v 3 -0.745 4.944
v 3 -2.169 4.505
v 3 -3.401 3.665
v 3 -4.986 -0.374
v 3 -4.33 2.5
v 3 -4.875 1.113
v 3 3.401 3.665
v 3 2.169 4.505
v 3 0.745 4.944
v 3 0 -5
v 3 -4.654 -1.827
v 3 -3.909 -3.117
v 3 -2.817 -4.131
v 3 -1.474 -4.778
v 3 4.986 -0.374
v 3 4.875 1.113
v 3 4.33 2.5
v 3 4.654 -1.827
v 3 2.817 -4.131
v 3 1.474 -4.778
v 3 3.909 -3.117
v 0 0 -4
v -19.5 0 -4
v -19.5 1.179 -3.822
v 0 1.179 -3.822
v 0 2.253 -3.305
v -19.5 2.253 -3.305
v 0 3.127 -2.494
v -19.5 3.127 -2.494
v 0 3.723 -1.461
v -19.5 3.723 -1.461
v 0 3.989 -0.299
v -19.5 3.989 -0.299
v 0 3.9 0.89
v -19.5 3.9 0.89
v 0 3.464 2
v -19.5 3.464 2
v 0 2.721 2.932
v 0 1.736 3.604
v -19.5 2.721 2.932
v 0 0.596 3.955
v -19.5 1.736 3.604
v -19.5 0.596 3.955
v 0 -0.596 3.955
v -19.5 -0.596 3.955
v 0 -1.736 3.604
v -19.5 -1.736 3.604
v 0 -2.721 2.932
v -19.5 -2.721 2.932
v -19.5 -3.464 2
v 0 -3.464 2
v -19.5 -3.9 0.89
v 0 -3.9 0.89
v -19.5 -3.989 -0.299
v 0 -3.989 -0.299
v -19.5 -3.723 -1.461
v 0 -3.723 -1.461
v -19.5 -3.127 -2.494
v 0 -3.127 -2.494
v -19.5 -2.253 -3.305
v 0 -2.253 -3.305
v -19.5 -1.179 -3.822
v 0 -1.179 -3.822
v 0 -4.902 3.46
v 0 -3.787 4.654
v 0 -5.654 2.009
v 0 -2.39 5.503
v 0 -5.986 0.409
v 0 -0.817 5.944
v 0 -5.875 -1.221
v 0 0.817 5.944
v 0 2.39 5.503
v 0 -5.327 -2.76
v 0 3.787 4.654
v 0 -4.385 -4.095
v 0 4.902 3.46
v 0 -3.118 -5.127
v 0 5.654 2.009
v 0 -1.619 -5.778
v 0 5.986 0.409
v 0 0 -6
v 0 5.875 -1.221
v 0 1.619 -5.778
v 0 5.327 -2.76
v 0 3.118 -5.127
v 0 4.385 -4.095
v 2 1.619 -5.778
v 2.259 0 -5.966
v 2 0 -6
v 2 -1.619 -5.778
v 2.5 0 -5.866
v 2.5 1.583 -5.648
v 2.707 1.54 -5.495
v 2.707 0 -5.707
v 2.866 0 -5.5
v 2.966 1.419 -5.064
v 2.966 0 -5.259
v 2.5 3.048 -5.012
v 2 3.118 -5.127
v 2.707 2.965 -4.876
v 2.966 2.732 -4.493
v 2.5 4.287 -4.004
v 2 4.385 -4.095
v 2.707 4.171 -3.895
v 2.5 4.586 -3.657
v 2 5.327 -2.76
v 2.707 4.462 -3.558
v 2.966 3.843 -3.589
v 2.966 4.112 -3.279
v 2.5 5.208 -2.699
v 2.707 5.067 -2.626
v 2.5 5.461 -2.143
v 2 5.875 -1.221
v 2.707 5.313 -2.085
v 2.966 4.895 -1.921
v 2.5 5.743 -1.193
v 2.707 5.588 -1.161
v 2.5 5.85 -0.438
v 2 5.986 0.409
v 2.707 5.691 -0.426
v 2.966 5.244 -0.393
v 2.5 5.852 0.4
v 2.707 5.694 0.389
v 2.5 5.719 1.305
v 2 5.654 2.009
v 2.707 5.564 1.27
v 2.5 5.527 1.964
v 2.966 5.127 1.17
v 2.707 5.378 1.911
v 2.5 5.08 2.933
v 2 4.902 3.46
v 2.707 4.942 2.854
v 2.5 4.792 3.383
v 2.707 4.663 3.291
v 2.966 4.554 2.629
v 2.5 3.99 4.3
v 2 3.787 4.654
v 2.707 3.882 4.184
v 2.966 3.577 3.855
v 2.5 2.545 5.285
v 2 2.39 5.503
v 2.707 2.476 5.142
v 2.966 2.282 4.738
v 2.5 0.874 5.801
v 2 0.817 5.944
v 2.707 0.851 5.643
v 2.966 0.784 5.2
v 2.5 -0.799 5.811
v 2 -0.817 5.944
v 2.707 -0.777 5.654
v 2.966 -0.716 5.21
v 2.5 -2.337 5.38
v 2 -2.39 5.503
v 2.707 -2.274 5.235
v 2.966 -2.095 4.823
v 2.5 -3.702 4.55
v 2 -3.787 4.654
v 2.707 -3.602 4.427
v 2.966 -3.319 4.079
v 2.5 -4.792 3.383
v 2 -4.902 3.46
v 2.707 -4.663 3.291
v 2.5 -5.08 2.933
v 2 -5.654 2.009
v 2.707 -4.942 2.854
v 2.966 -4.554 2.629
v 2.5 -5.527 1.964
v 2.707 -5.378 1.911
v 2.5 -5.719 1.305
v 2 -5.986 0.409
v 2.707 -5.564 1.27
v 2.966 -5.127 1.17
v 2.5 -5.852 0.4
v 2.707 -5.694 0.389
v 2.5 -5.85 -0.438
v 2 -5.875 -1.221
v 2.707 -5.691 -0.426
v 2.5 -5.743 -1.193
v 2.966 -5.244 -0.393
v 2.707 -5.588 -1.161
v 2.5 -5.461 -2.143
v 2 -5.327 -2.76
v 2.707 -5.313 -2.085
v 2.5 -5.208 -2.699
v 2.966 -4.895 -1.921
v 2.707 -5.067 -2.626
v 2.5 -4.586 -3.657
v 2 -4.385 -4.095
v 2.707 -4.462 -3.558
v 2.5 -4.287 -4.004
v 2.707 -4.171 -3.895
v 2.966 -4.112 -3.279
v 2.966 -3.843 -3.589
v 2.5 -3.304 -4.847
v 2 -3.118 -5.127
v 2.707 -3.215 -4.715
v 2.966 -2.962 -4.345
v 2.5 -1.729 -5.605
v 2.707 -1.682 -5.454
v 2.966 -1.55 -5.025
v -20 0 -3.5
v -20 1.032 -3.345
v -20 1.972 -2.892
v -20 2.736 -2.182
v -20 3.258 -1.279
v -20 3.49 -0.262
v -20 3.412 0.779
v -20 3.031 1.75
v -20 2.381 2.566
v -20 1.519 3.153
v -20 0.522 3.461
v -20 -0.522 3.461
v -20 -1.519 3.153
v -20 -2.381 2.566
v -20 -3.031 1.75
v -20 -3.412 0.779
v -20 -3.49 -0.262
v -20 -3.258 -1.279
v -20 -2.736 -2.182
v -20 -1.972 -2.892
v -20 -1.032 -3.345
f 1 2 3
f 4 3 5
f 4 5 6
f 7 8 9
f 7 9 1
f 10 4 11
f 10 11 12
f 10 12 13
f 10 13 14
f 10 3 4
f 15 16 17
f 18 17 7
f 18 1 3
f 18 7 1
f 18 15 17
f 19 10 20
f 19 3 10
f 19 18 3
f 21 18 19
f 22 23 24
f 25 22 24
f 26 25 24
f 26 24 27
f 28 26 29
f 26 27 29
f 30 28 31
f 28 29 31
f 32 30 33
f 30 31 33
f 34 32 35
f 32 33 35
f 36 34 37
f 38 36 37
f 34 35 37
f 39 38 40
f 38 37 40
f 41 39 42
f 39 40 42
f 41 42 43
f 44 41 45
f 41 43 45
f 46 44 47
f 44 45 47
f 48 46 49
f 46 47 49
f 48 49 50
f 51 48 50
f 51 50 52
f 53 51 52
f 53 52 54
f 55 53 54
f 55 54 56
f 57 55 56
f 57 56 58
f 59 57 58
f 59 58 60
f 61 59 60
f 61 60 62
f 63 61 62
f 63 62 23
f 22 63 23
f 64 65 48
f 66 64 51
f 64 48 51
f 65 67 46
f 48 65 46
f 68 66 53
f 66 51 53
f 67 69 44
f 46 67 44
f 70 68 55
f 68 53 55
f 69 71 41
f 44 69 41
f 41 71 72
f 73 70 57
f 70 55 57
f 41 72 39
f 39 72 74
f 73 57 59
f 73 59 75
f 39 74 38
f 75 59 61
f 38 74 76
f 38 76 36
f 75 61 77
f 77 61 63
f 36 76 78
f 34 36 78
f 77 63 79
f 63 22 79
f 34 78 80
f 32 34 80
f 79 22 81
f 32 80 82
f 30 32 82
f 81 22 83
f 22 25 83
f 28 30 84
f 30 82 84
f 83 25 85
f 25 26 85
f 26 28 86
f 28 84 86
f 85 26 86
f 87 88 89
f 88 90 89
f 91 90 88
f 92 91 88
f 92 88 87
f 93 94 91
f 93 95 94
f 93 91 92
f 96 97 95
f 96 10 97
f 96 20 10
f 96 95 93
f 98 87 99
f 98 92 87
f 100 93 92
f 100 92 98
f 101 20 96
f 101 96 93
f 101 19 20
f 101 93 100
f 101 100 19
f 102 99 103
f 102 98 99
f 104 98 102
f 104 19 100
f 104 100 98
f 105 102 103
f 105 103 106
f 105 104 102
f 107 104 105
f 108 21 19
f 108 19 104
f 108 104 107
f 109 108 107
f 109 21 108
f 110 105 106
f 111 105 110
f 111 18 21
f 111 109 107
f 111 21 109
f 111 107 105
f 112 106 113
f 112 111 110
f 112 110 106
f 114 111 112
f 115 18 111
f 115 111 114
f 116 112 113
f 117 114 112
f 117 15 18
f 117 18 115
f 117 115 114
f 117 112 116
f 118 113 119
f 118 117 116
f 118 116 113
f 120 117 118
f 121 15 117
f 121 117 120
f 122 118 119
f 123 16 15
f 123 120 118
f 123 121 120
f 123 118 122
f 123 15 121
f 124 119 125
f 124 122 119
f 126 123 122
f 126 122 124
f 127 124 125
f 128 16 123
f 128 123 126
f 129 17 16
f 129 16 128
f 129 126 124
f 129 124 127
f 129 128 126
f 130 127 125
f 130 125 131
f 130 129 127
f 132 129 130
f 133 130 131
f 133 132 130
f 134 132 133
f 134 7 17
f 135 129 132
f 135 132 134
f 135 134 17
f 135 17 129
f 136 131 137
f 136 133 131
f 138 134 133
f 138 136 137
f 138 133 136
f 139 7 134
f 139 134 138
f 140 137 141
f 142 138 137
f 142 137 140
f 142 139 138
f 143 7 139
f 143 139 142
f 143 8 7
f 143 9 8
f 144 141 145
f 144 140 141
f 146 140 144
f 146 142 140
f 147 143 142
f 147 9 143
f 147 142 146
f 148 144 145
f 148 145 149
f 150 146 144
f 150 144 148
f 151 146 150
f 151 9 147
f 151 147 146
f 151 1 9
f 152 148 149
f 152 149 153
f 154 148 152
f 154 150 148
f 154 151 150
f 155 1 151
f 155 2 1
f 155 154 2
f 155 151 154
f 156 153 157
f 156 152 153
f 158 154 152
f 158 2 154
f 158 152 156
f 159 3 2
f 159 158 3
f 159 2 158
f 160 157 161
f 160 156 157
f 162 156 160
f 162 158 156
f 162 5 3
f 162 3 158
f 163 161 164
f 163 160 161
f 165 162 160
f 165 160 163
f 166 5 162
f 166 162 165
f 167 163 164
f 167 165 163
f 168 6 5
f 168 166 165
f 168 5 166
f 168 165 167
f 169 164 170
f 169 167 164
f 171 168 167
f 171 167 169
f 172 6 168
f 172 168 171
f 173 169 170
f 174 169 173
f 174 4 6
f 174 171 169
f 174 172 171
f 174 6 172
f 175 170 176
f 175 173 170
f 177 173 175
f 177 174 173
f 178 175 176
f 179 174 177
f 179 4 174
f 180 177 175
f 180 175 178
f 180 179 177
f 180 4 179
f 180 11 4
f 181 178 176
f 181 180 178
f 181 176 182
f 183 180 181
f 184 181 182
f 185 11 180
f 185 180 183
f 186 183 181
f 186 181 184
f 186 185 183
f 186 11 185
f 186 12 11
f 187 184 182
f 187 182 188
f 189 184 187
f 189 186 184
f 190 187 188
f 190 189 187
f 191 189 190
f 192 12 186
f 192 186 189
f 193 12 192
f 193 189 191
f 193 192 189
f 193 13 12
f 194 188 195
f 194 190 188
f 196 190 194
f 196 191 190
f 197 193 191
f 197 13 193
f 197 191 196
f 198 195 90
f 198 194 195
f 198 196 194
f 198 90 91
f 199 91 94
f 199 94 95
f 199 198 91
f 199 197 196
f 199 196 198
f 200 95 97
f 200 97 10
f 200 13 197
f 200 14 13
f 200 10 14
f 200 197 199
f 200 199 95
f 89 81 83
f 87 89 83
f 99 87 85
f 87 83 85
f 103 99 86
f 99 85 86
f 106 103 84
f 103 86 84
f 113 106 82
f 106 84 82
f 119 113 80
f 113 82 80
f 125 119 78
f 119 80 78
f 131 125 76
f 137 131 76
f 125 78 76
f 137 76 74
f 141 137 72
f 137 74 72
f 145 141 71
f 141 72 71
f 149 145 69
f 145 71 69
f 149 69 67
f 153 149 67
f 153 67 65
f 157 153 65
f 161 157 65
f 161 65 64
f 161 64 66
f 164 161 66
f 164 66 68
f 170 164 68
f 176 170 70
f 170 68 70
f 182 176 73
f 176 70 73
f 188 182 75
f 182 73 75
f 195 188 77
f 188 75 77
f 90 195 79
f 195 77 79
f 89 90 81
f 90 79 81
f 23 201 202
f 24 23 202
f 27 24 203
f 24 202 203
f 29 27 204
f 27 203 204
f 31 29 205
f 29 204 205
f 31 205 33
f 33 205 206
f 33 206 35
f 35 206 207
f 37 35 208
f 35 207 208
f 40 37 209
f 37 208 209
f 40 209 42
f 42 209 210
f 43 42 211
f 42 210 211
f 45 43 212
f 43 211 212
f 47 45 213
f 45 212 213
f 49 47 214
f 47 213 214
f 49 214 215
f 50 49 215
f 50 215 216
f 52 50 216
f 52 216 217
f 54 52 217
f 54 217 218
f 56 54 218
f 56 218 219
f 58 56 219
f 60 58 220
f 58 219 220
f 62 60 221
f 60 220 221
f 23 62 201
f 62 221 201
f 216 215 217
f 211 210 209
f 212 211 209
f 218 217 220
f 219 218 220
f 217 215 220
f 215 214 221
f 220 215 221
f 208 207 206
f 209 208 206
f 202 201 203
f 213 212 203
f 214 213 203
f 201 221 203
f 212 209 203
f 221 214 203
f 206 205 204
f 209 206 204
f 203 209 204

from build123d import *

# Parameters (mm, degrees)
SKETCH1_R           = 6
SKETCH1_R_2         = 4
BOSS_EXTRUDE1_DEPTH = 3
BOSS_EXTRUDE2_START = -23
SKETCH2_R           = 4
BOSS_EXTRUDE2_DEPTH = 23
FILLET1_R           = 1
CHAMFER1_SIZE       = 0.5


with BuildPart() as part:
    # Sketch1 → Boss-Extrude1 (new body)
    with BuildSketch(Plane(origin=(0, 0, 0), x_dir=(0, 0, -1), z_dir=(1, 0, 0))):
        Circle(SKETCH1_R)
        Circle(SKETCH1_R_2, mode=Mode.SUBTRACT)
    extrude(amount=BOSS_EXTRUDE1_DEPTH)

    # Sketch2 → Boss-Extrude2 (add)
    with BuildSketch(Plane(origin=(3, 0, 0), x_dir=(0, 0, -1), z_dir=(1, 0, 0)).offset(BOSS_EXTRUDE2_START)):
        Circle(SKETCH2_R)
    extrude(amount=BOSS_EXTRUDE2_DEPTH)

    # Fillet1
    fillet1_edges = [part.edges().sort_by_distance(p)[0] for p in [
        (3, 0, 6),
    ]]
    fillet(fillet1_edges, radius=FILLET1_R)

    # Chamfer1
    chamfer1_edges = [part.edges().sort_by_distance(p)[0] for p in [
        (-20, 0, 4),
    ]]
    chamfer(chamfer1_edges, length=CHAMFER1_SIZE)


solid = part.part
